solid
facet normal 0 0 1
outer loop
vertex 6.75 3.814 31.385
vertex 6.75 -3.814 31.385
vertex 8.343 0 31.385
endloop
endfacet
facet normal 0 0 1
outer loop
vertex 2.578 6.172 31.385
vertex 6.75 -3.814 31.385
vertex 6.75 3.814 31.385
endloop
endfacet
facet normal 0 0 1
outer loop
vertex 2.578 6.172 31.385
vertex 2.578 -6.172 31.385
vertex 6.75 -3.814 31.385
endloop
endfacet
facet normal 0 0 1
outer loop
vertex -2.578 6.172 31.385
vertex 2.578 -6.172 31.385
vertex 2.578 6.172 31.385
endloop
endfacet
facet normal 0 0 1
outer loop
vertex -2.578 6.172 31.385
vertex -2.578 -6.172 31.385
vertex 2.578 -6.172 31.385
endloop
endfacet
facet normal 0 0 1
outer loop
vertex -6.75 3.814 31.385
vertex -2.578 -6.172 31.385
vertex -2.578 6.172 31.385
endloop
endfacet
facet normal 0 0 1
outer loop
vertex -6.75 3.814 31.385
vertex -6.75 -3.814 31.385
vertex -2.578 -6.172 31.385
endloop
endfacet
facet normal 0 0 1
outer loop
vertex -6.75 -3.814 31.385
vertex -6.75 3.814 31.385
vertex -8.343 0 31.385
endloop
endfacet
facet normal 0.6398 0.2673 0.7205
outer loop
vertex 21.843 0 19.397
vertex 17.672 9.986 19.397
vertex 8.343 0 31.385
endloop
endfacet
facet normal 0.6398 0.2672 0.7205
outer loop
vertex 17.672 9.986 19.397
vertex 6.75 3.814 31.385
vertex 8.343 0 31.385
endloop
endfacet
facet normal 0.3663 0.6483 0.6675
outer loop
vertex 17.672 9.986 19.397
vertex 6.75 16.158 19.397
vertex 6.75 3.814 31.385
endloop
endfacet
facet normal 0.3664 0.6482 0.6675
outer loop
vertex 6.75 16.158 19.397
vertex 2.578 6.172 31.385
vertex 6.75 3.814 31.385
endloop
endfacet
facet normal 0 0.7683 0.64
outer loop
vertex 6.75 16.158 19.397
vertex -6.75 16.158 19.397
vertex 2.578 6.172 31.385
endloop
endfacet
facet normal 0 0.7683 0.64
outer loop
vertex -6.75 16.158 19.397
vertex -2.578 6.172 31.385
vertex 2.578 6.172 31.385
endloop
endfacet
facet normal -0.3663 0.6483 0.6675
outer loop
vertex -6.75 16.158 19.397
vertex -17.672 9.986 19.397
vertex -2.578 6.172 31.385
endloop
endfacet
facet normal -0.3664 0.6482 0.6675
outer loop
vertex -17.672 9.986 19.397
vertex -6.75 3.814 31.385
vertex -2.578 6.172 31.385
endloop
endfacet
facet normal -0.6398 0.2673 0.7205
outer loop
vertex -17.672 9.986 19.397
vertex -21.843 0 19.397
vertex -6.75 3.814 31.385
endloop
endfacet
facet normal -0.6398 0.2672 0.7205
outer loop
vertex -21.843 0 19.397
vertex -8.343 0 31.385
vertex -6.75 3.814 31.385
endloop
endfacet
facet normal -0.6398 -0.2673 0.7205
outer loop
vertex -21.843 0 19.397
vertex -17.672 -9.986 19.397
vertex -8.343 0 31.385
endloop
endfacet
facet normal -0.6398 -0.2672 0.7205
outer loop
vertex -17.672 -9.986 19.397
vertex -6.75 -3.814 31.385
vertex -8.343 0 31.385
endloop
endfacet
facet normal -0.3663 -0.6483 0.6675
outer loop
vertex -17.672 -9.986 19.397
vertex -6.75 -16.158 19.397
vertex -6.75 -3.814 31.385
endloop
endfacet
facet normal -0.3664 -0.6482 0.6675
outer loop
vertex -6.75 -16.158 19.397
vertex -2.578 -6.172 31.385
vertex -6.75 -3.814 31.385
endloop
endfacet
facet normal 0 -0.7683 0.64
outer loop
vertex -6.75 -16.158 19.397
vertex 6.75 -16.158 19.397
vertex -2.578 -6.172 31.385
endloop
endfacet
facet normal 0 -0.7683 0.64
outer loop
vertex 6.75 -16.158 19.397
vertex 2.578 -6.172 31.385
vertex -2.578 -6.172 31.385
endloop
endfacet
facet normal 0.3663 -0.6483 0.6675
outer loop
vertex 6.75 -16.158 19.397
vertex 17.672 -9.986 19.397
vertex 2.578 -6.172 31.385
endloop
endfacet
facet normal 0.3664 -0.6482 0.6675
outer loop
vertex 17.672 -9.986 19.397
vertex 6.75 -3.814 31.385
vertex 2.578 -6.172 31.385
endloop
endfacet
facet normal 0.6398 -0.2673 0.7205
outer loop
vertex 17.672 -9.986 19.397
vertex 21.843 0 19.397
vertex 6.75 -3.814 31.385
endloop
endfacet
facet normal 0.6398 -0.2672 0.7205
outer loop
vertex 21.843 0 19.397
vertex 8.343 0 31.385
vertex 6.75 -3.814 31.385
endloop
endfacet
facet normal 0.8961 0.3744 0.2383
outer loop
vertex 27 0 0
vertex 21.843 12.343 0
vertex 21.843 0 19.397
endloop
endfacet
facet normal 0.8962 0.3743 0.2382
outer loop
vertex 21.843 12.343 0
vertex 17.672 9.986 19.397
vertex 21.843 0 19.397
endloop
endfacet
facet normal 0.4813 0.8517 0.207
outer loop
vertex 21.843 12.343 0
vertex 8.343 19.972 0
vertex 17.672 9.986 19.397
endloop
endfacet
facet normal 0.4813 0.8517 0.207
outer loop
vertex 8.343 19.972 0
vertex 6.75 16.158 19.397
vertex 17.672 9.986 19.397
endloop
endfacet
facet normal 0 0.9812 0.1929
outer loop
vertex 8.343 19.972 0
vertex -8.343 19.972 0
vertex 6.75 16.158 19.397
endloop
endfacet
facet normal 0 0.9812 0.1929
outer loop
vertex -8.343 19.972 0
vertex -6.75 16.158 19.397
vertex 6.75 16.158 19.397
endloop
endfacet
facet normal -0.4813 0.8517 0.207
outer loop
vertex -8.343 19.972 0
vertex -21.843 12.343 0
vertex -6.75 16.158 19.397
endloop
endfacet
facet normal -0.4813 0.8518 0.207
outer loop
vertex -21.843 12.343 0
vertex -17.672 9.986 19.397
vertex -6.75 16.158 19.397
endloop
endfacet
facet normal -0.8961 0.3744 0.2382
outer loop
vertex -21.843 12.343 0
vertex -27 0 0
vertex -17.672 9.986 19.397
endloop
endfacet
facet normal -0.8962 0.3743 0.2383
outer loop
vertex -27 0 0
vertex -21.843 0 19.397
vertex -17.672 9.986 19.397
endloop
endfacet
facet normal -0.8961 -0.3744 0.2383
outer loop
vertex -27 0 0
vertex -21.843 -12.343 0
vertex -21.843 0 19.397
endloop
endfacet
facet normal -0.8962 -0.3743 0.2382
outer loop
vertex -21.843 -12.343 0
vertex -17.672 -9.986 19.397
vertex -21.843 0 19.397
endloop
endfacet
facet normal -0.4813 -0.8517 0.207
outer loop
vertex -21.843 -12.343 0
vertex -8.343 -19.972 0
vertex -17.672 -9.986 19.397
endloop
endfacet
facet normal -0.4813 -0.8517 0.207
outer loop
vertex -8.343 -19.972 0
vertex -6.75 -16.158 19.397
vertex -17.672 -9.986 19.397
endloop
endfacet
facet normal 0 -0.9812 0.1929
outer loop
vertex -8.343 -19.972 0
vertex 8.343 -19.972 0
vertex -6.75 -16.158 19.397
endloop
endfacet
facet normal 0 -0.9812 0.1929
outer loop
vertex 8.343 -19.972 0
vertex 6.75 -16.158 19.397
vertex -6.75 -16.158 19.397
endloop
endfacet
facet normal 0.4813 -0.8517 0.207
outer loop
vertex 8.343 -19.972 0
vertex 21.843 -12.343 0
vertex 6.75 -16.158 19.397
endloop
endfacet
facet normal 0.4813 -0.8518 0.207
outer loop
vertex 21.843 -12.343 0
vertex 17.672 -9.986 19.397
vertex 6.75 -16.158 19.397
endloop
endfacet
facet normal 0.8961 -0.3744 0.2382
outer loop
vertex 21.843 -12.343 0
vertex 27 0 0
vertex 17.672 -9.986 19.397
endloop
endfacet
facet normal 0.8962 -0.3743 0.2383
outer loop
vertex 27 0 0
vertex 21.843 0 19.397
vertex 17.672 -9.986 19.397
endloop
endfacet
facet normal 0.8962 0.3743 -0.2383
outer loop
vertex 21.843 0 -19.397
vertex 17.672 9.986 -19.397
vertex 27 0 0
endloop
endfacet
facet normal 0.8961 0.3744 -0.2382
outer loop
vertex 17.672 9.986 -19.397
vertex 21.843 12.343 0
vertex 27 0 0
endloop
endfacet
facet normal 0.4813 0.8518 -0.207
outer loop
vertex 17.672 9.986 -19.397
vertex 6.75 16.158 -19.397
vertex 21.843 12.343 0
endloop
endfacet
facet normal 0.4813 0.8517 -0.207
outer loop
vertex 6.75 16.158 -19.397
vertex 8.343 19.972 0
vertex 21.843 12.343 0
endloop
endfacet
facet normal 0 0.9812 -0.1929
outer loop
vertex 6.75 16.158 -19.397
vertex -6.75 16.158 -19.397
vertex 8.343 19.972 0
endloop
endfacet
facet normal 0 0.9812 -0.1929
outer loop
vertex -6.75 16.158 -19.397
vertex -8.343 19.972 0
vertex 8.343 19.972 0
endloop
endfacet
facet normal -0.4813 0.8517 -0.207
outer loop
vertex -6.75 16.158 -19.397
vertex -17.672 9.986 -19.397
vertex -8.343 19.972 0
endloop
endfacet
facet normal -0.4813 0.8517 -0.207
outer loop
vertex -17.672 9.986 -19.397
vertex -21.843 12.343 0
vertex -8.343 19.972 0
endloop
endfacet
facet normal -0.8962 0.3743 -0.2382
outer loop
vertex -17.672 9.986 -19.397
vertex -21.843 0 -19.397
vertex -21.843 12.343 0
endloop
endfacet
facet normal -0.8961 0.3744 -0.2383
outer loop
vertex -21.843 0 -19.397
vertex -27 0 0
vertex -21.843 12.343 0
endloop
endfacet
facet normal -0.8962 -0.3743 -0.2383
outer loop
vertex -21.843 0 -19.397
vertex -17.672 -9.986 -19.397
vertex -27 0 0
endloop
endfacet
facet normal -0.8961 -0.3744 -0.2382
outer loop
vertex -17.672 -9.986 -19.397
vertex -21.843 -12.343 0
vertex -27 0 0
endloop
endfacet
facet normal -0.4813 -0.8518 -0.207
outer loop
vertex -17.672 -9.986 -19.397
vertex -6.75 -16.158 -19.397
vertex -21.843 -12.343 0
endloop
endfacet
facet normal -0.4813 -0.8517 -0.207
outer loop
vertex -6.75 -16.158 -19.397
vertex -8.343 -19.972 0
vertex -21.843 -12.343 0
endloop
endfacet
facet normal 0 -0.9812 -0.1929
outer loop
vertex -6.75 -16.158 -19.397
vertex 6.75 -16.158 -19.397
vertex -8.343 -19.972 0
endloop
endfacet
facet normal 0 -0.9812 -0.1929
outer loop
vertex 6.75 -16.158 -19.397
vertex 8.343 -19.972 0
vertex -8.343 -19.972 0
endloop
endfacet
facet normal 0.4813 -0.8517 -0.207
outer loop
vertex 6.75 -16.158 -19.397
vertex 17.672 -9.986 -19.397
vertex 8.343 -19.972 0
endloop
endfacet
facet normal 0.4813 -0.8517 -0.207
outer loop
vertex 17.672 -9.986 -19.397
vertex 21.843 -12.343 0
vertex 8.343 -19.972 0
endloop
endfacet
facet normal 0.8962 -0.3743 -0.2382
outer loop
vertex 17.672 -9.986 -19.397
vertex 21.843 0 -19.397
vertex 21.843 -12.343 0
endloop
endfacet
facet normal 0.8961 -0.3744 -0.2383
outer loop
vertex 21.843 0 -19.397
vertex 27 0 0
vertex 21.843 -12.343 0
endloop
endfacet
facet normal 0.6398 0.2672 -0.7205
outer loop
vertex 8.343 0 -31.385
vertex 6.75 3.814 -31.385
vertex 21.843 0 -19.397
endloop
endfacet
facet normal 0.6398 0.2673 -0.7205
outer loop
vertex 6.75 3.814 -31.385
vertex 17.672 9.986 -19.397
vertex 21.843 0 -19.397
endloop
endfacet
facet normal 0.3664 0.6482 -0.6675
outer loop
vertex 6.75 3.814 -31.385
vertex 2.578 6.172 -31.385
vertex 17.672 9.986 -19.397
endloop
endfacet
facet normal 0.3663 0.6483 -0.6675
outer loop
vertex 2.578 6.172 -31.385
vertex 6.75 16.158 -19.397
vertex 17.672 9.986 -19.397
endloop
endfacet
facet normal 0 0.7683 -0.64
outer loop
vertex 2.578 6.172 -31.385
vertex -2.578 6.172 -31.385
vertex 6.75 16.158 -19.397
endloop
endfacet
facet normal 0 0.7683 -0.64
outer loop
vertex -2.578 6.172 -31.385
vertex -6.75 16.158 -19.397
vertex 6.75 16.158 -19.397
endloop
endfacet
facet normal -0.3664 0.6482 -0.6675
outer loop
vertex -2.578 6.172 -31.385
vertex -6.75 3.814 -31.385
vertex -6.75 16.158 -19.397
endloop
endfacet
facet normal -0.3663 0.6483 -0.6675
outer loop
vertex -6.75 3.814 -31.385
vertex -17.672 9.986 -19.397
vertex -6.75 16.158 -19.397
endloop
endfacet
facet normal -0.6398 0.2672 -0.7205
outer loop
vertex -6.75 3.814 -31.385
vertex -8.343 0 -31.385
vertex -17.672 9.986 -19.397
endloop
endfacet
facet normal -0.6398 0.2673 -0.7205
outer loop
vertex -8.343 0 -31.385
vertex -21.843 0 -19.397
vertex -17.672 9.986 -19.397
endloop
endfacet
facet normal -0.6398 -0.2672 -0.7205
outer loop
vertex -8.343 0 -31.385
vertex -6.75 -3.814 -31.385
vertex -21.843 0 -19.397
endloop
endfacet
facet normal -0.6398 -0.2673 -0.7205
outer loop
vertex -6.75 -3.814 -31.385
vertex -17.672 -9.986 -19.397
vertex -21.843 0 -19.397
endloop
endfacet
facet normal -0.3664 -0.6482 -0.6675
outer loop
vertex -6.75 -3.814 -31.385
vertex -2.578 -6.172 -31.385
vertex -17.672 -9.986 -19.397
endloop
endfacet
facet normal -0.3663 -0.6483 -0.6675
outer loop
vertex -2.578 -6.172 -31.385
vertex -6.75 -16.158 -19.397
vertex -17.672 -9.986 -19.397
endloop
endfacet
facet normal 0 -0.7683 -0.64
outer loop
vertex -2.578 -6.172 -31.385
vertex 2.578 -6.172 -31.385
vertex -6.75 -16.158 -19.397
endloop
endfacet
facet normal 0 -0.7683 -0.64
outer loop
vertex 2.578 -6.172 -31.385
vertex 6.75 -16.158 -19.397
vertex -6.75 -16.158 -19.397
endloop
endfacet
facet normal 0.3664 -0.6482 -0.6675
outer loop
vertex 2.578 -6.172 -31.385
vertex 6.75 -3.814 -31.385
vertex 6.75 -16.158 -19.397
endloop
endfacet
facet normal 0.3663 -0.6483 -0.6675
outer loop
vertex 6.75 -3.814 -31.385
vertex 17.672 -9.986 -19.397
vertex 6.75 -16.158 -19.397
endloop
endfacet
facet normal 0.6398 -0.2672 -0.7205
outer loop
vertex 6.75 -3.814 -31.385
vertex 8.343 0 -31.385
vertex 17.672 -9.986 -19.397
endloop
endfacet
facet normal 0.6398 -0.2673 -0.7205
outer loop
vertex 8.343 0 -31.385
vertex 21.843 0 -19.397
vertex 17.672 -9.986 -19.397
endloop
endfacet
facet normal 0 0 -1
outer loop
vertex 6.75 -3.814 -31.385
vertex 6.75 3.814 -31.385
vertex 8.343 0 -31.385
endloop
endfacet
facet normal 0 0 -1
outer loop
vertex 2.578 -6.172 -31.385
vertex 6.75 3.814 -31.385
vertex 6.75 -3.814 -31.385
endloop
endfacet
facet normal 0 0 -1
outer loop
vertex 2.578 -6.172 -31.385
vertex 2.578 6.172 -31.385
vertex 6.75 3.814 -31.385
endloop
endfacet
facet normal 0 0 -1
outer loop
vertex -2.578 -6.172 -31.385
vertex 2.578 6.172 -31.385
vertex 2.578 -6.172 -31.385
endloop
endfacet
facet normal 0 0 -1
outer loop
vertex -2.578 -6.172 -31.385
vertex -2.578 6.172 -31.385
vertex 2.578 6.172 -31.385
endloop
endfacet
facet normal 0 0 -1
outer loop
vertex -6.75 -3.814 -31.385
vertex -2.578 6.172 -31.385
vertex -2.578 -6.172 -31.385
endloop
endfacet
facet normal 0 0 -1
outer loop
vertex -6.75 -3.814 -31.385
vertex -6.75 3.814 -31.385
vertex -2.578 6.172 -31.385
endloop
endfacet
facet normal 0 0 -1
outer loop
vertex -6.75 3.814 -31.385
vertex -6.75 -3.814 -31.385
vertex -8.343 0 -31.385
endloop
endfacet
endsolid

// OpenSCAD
// Generated by SolidPython 1.0.1 on 2020-07-29 00:46:48


scale(v = [9, 7, 11]) {
	sphere(r = 3);
}
/***********************************************
*********      SolidPython code:      **********
************************************************
 
# import packages: SolidPython
from solid import *
from solid.utils import *
from itertools import chain, combinations, permutations


class Resize:

    def __init__(self, scad_file):
        self.scad_file = scad_file
        #self.scad_file = import_scad(scad_file)
        # cone/cylinder param:
        self.r1 = 0
        self.r2 = 0
        self.h = 0
        # rectangular prism param:
        self.w = 0
        self.l = 0
        # ellipse param:
        self.r = 0

    # import OpenScad code (file name corresponds to shape)


    # classify shape + parameters
    def assign(self, param1, param2, param3):
        if self.scad_file == 'cone.scad':
            self.r1 = param1
            self.r2 = param2
            self.h = param3
        elif self.scad_file == 'cylinder.scad':
            self.r1 = param1
            self.r2 = param2
            self.h = param3
        elif self.scad_file == 'rectangularPrism.scad':
            self.h = param1
            self.l = param2
            self.w = param3
        else:
            self.r = param1
            self.h = param2

    # resize parameters
    def iterate(self):
        x = range(3, 20, 2)
        i = 1
        if self.scad_file == 'cone.scad':
            tempList = list(permutations(x, 2))
            for temp in tempList:
                param1 = temp[0]
                param2 = temp[1]
                filepath = 'produced_scad_files/' + 'cone' + str(param1) + '_' + str(param2) + '_' + '.scad'
                scad_render_to_file(cylinder(h=param1, r1=param2, r2=0), filepath)

        elif self.scad_file == 'cylinder.scad':
            tempList = list(permutations(x, 3))
            for temp in tempList:
                param1 = temp[0]
                param2 = temp[1]
                filepath = 'produced_scad_files/' + 'cylinder' + str(param1) + '_' + str(param2) + '_' + '.scad'
                scad_render_to_file(cylinder(h=param1, r1=param2, r2=param2), filepath)

        elif self.scad_file == 'rectangularPrism.scad':
            tempList = list(permutations(x, 3))
            for temp in tempList:
                param1 = temp[0]
                param2 = temp[1]
                param3 = temp[2]
                filepath = 'produced_scad_files/' + 'rectangularPrism' + str(param1) + '_' + str(param2) + '_' + str(
                    param3) + '.scad'
                scad_render_to_file(cube(size=(param1, param2, param3)), filepath)

        elif self.scad_file == 'ellipse.scad':
            tempList = list(permutations(x, 4))
            for temp in tempList:
                param1 = temp[0]
                param2 = temp[1]
                param3 = temp[2]
                param4 = temp[3]
                filepath = 'produced_scad_files/' + 'ellipse' + str(param1) + '_' + str(param2) + '_' + str(param3) + '_' + str(param4) + '.scad'
                scad_render_to_file(scale([param1, param2, param3])(sphere(r=param4)), filepath)

    def render_to_scadfile(self):
        scad_render_to_file(scad, 'example.scad') 
 
************************************************/
